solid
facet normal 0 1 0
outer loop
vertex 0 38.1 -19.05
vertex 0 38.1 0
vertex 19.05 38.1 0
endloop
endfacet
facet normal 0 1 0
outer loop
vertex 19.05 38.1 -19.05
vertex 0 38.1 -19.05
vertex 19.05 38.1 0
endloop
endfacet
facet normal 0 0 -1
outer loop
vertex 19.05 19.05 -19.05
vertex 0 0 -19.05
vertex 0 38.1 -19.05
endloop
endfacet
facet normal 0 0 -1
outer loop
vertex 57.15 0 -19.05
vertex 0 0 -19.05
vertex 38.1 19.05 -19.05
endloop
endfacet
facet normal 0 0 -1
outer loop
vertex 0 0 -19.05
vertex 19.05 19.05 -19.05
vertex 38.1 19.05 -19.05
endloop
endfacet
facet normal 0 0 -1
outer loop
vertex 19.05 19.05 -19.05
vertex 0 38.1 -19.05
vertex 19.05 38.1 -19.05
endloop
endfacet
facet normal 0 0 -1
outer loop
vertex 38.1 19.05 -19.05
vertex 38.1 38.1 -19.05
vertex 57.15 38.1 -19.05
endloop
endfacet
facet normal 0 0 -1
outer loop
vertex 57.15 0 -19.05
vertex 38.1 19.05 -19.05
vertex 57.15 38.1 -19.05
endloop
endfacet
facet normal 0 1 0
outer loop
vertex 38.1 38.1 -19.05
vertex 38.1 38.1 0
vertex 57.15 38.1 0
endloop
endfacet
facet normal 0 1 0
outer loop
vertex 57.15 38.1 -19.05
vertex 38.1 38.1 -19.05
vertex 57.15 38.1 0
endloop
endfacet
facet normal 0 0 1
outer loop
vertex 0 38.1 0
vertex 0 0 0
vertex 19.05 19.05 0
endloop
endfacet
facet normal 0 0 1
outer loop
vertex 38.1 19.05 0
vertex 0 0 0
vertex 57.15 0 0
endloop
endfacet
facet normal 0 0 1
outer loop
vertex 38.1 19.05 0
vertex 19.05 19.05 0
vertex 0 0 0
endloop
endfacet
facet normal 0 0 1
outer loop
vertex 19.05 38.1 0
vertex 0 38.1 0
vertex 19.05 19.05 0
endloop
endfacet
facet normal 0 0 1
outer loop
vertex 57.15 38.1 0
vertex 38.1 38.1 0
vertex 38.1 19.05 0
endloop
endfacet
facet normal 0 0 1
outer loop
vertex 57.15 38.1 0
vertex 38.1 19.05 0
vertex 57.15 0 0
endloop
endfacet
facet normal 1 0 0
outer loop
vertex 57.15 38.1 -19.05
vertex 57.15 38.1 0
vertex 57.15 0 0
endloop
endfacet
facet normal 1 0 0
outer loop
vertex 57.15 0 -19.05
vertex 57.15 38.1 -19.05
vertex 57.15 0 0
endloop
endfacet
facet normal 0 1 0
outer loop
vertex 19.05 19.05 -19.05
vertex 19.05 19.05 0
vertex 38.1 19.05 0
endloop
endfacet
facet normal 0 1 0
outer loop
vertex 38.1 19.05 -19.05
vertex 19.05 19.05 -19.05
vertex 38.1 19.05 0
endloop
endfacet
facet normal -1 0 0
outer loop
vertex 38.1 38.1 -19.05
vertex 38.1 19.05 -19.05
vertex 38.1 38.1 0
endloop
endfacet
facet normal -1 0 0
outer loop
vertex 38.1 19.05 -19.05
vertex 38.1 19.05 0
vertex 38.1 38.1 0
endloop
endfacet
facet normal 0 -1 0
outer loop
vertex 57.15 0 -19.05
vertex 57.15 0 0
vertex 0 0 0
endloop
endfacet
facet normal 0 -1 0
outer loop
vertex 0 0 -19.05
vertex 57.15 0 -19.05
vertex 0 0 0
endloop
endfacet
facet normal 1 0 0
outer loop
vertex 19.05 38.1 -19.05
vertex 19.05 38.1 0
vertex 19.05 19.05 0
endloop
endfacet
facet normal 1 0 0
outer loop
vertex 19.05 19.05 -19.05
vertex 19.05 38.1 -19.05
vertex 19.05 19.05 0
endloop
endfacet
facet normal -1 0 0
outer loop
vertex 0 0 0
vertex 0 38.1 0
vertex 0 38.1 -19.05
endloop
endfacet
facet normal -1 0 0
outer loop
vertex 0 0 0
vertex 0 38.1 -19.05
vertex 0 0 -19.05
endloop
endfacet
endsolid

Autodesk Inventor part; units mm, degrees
ref_plane "YZ Plane" through (0, 0, 0) normal (1, 0, 0) x (0, 1, 0)
ref_plane "XZ Plane" through (0, 0, 0) normal (0, 1, 0) x (-1, 0, 0)
ref_plane "XY Plane" through (0, 0, 0) normal (0, 0, 1) x (1, 0, 0)
sketch "Sketch1" plane through (0, 0, 0) normal (0, 0, 1) x (1, 0, 0)
  point P0 (0, 0)
sketch "Sketch2" plane through (0, 0, 0) normal (0, 0, 1) x (1, 0, 0)
  line L0 (0, 38.1) -> (0, 0)
  line L1 (0, 38.1) -> (19.05, 38.1)
  line L2 (19.05, 38.1) -> (19.05, 19.05)
  line L3 (19.05, 19.05) -> (38.1, 19.05)
  line L4 (38.1, 19.05) -> (38.1, 38.1)
  line L5 (38.1, 38.1) -> (57.15, 38.1)
  line L6 (57.15, 38.1) -> (57.15, 0)
  line L7 (57.15, 0) -> (0, 0)
  dimension "d0" = 38.1
  dimension "d1" = 19.05
  dimension "d2" = 19.05
  dimension "d3" = 19.05
  dimension "d4" = 19.05
  dimension "d5" = 19.05
extrude "Extrusion1" add sketch "Sketch2" against normal blind 19.05
equation "\"d0\" = 2 * cube"
equation "\"d1\" = cube"
equation "\"d2\" = cube"
equation "\"d3\" = cube"
equation "\"d5\" = cube"
equation "\"d6\" = cube"
equation "\"cube\" = 19.05"
properties part number "IED7_Sun_PuzzleCubeRed"
